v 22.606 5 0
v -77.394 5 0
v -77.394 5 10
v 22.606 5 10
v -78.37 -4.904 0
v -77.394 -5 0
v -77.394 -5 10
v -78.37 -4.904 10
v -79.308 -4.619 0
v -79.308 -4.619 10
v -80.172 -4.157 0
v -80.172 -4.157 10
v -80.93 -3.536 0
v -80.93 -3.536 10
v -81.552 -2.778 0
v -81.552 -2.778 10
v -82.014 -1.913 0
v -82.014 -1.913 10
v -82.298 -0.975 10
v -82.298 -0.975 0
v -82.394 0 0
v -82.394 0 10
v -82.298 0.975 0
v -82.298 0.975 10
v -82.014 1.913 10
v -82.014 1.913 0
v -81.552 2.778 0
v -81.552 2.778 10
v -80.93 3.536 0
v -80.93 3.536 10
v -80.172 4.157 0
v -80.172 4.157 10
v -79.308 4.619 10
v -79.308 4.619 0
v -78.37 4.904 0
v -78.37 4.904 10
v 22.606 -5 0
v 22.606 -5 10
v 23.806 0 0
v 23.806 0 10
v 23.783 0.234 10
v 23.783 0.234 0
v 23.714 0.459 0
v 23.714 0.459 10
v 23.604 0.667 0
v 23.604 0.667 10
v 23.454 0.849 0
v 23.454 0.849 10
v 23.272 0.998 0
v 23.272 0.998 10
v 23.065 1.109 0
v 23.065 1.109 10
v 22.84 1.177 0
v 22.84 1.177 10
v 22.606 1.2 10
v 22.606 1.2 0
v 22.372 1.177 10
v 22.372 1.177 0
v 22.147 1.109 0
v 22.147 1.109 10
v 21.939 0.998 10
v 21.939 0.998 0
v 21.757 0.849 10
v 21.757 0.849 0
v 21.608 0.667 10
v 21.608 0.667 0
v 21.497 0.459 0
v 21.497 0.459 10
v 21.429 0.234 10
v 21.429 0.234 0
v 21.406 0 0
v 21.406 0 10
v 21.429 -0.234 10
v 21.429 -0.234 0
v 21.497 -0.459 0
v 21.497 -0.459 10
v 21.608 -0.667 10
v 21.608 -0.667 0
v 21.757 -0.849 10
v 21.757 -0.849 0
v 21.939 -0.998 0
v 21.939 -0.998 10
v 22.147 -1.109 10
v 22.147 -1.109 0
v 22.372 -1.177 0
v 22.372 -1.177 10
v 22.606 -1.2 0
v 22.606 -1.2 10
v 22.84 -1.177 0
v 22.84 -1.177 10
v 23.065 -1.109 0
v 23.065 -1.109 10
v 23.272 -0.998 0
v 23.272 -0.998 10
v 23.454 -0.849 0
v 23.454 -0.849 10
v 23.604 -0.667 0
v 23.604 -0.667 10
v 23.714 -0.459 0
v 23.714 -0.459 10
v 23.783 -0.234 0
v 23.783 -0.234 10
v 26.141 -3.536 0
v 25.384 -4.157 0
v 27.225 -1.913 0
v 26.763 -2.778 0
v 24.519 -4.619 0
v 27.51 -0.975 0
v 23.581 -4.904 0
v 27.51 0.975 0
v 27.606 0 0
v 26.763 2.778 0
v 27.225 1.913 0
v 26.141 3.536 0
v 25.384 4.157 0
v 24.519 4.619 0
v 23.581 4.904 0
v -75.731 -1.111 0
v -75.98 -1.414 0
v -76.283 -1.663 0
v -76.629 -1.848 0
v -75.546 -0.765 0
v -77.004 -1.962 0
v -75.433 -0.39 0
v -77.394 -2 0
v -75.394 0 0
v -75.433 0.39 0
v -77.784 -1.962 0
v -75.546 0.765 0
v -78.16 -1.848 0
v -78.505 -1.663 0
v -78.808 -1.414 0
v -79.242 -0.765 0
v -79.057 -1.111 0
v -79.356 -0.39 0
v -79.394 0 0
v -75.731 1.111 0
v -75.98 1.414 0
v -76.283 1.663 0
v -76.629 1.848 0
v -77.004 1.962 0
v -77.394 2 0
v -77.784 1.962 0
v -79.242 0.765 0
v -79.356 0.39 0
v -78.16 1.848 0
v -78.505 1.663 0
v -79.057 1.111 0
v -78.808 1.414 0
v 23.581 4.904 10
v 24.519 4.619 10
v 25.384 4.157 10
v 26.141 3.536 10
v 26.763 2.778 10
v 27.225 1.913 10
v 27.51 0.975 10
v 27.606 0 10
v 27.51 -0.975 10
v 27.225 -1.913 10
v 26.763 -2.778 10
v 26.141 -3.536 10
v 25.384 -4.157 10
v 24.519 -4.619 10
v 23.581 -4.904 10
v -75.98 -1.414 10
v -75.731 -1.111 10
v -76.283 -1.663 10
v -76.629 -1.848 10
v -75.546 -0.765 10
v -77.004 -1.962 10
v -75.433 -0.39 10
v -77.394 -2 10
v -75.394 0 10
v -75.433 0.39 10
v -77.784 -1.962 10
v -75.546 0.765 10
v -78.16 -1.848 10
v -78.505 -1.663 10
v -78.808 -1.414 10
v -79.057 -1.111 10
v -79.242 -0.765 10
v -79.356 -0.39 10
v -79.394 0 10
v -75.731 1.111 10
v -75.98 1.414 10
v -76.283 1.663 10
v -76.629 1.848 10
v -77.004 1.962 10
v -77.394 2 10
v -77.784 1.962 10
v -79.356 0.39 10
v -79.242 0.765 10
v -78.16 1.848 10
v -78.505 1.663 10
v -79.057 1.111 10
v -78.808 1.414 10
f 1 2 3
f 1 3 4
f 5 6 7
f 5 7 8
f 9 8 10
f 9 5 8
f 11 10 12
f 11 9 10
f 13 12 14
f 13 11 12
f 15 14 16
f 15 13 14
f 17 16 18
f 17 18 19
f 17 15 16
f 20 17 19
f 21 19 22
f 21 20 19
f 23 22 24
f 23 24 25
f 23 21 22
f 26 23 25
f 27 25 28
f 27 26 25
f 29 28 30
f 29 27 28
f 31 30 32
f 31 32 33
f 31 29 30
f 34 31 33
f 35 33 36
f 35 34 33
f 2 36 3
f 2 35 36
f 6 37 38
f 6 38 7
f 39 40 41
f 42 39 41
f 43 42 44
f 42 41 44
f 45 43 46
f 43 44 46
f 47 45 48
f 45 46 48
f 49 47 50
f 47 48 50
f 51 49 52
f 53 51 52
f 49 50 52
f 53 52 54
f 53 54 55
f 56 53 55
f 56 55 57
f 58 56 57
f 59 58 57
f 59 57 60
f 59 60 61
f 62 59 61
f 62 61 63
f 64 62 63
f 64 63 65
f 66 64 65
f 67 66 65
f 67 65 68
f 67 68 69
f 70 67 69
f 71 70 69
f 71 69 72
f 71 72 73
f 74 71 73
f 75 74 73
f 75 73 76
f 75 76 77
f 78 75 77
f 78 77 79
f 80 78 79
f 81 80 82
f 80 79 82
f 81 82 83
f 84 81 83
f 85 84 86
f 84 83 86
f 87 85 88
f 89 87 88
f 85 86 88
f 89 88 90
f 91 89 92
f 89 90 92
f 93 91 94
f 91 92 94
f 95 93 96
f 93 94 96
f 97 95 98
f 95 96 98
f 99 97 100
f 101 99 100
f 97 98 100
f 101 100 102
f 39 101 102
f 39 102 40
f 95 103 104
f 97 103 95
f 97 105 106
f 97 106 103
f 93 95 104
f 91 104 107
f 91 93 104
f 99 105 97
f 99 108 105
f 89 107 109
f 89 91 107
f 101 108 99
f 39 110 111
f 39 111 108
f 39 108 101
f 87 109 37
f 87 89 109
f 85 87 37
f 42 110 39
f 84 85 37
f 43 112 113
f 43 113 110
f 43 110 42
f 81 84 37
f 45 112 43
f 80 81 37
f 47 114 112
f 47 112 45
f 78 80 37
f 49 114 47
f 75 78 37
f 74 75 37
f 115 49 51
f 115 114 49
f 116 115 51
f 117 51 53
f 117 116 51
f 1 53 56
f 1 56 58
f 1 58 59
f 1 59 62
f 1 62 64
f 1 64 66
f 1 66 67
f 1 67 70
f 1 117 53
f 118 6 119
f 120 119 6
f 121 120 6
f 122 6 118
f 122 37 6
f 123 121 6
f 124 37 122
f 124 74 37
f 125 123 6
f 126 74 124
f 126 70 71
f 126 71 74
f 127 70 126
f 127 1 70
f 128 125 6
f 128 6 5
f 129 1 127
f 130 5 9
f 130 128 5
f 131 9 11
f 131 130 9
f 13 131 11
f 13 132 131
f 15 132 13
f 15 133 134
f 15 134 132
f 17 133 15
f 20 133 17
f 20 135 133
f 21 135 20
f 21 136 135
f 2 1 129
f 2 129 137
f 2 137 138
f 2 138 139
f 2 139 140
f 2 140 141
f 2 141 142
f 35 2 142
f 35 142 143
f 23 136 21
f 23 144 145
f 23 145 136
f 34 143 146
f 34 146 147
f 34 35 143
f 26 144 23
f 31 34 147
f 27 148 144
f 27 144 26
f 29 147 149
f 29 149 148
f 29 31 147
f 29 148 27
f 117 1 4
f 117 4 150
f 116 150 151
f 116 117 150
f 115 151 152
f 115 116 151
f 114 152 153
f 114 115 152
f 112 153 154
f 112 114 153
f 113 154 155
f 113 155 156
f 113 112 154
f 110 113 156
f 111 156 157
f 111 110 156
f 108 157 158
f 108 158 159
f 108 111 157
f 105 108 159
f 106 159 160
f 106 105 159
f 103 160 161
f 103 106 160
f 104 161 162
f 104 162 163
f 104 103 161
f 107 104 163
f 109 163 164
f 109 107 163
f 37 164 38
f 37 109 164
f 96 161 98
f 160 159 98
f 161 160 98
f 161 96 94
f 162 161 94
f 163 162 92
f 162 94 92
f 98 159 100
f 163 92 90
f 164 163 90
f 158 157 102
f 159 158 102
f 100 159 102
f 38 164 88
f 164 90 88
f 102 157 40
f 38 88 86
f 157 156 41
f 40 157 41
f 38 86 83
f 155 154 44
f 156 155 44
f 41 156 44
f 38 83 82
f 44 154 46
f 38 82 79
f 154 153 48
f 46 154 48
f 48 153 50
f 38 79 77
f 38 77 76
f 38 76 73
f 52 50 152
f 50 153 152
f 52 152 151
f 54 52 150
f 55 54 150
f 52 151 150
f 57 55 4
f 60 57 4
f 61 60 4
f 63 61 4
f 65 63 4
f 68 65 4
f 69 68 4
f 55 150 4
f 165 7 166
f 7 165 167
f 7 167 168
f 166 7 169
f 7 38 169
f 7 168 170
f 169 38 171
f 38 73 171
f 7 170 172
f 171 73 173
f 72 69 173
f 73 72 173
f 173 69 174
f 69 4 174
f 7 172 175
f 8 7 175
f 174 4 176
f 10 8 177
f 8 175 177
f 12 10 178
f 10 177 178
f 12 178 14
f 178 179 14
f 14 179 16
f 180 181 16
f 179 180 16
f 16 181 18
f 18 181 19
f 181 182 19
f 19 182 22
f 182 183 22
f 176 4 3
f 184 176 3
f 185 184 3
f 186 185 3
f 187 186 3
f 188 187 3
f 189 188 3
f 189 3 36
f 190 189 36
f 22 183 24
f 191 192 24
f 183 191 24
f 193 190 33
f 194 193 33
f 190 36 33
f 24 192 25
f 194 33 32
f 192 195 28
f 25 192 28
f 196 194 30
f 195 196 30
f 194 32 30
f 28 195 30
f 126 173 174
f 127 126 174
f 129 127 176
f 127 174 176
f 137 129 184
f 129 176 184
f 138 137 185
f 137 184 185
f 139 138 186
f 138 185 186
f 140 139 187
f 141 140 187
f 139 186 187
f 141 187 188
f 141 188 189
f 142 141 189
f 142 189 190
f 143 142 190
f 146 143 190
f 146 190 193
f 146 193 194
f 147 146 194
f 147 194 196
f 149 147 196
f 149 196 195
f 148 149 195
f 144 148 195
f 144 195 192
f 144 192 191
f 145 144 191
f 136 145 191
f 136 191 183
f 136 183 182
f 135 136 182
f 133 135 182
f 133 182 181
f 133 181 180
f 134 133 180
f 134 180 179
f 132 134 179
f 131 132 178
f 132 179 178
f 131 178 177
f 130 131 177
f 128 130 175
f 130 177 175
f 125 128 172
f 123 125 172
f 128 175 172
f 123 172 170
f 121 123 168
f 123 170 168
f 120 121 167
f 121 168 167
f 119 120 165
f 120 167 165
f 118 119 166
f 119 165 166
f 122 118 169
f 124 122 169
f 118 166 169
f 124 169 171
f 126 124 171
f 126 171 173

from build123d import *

# Parameters (mm, degrees)
EXTRUDE_1_DEPTH     = 10
SKETCH_2_R          = 2
CUT_EXTRUDE_1_DEPTH = 84.149305617
SKETCH_3_R          = 1.2
CUT_EXTRUDE_2_DEPTH = 84.149305617


with BuildPart() as part:
    # 草图1 → 凸台-拉伸1 (new body)
    with BuildSketch(Plane.XY):
        with BuildLine():
            Line((-77.394217179, 5), (22.605782821, 5))
            ThreePointArc((22.605782821, 5), (27.605782821, 0), (22.605782821, -5))
            Line((22.605782821, -5), (-77.394217179, -5))
            ThreePointArc((-77.394217179, -5), (-82.394217179, 0), (-77.394217179, 5))
        make_face()
    extrude(amount=EXTRUDE_1_DEPTH)

    # 草图2 → 切除-拉伸1 (cut, through all)
    with BuildSketch(Plane.XY.offset(10)):
        with Locations((-77.394217179, 0)):
            Circle(SKETCH_2_R)
    extrude(amount=-CUT_EXTRUDE_1_DEPTH, mode=Mode.SUBTRACT)

    # 草图3 → 切除-拉伸2 (cut, through all)
    with BuildSketch(Plane.XY.offset(10)):
        with Locations((22.605782821, 0)):
            Circle(SKETCH_3_R)
    extrude(amount=-CUT_EXTRUDE_2_DEPTH, mode=Mode.SUBTRACT)


solid = part.part
